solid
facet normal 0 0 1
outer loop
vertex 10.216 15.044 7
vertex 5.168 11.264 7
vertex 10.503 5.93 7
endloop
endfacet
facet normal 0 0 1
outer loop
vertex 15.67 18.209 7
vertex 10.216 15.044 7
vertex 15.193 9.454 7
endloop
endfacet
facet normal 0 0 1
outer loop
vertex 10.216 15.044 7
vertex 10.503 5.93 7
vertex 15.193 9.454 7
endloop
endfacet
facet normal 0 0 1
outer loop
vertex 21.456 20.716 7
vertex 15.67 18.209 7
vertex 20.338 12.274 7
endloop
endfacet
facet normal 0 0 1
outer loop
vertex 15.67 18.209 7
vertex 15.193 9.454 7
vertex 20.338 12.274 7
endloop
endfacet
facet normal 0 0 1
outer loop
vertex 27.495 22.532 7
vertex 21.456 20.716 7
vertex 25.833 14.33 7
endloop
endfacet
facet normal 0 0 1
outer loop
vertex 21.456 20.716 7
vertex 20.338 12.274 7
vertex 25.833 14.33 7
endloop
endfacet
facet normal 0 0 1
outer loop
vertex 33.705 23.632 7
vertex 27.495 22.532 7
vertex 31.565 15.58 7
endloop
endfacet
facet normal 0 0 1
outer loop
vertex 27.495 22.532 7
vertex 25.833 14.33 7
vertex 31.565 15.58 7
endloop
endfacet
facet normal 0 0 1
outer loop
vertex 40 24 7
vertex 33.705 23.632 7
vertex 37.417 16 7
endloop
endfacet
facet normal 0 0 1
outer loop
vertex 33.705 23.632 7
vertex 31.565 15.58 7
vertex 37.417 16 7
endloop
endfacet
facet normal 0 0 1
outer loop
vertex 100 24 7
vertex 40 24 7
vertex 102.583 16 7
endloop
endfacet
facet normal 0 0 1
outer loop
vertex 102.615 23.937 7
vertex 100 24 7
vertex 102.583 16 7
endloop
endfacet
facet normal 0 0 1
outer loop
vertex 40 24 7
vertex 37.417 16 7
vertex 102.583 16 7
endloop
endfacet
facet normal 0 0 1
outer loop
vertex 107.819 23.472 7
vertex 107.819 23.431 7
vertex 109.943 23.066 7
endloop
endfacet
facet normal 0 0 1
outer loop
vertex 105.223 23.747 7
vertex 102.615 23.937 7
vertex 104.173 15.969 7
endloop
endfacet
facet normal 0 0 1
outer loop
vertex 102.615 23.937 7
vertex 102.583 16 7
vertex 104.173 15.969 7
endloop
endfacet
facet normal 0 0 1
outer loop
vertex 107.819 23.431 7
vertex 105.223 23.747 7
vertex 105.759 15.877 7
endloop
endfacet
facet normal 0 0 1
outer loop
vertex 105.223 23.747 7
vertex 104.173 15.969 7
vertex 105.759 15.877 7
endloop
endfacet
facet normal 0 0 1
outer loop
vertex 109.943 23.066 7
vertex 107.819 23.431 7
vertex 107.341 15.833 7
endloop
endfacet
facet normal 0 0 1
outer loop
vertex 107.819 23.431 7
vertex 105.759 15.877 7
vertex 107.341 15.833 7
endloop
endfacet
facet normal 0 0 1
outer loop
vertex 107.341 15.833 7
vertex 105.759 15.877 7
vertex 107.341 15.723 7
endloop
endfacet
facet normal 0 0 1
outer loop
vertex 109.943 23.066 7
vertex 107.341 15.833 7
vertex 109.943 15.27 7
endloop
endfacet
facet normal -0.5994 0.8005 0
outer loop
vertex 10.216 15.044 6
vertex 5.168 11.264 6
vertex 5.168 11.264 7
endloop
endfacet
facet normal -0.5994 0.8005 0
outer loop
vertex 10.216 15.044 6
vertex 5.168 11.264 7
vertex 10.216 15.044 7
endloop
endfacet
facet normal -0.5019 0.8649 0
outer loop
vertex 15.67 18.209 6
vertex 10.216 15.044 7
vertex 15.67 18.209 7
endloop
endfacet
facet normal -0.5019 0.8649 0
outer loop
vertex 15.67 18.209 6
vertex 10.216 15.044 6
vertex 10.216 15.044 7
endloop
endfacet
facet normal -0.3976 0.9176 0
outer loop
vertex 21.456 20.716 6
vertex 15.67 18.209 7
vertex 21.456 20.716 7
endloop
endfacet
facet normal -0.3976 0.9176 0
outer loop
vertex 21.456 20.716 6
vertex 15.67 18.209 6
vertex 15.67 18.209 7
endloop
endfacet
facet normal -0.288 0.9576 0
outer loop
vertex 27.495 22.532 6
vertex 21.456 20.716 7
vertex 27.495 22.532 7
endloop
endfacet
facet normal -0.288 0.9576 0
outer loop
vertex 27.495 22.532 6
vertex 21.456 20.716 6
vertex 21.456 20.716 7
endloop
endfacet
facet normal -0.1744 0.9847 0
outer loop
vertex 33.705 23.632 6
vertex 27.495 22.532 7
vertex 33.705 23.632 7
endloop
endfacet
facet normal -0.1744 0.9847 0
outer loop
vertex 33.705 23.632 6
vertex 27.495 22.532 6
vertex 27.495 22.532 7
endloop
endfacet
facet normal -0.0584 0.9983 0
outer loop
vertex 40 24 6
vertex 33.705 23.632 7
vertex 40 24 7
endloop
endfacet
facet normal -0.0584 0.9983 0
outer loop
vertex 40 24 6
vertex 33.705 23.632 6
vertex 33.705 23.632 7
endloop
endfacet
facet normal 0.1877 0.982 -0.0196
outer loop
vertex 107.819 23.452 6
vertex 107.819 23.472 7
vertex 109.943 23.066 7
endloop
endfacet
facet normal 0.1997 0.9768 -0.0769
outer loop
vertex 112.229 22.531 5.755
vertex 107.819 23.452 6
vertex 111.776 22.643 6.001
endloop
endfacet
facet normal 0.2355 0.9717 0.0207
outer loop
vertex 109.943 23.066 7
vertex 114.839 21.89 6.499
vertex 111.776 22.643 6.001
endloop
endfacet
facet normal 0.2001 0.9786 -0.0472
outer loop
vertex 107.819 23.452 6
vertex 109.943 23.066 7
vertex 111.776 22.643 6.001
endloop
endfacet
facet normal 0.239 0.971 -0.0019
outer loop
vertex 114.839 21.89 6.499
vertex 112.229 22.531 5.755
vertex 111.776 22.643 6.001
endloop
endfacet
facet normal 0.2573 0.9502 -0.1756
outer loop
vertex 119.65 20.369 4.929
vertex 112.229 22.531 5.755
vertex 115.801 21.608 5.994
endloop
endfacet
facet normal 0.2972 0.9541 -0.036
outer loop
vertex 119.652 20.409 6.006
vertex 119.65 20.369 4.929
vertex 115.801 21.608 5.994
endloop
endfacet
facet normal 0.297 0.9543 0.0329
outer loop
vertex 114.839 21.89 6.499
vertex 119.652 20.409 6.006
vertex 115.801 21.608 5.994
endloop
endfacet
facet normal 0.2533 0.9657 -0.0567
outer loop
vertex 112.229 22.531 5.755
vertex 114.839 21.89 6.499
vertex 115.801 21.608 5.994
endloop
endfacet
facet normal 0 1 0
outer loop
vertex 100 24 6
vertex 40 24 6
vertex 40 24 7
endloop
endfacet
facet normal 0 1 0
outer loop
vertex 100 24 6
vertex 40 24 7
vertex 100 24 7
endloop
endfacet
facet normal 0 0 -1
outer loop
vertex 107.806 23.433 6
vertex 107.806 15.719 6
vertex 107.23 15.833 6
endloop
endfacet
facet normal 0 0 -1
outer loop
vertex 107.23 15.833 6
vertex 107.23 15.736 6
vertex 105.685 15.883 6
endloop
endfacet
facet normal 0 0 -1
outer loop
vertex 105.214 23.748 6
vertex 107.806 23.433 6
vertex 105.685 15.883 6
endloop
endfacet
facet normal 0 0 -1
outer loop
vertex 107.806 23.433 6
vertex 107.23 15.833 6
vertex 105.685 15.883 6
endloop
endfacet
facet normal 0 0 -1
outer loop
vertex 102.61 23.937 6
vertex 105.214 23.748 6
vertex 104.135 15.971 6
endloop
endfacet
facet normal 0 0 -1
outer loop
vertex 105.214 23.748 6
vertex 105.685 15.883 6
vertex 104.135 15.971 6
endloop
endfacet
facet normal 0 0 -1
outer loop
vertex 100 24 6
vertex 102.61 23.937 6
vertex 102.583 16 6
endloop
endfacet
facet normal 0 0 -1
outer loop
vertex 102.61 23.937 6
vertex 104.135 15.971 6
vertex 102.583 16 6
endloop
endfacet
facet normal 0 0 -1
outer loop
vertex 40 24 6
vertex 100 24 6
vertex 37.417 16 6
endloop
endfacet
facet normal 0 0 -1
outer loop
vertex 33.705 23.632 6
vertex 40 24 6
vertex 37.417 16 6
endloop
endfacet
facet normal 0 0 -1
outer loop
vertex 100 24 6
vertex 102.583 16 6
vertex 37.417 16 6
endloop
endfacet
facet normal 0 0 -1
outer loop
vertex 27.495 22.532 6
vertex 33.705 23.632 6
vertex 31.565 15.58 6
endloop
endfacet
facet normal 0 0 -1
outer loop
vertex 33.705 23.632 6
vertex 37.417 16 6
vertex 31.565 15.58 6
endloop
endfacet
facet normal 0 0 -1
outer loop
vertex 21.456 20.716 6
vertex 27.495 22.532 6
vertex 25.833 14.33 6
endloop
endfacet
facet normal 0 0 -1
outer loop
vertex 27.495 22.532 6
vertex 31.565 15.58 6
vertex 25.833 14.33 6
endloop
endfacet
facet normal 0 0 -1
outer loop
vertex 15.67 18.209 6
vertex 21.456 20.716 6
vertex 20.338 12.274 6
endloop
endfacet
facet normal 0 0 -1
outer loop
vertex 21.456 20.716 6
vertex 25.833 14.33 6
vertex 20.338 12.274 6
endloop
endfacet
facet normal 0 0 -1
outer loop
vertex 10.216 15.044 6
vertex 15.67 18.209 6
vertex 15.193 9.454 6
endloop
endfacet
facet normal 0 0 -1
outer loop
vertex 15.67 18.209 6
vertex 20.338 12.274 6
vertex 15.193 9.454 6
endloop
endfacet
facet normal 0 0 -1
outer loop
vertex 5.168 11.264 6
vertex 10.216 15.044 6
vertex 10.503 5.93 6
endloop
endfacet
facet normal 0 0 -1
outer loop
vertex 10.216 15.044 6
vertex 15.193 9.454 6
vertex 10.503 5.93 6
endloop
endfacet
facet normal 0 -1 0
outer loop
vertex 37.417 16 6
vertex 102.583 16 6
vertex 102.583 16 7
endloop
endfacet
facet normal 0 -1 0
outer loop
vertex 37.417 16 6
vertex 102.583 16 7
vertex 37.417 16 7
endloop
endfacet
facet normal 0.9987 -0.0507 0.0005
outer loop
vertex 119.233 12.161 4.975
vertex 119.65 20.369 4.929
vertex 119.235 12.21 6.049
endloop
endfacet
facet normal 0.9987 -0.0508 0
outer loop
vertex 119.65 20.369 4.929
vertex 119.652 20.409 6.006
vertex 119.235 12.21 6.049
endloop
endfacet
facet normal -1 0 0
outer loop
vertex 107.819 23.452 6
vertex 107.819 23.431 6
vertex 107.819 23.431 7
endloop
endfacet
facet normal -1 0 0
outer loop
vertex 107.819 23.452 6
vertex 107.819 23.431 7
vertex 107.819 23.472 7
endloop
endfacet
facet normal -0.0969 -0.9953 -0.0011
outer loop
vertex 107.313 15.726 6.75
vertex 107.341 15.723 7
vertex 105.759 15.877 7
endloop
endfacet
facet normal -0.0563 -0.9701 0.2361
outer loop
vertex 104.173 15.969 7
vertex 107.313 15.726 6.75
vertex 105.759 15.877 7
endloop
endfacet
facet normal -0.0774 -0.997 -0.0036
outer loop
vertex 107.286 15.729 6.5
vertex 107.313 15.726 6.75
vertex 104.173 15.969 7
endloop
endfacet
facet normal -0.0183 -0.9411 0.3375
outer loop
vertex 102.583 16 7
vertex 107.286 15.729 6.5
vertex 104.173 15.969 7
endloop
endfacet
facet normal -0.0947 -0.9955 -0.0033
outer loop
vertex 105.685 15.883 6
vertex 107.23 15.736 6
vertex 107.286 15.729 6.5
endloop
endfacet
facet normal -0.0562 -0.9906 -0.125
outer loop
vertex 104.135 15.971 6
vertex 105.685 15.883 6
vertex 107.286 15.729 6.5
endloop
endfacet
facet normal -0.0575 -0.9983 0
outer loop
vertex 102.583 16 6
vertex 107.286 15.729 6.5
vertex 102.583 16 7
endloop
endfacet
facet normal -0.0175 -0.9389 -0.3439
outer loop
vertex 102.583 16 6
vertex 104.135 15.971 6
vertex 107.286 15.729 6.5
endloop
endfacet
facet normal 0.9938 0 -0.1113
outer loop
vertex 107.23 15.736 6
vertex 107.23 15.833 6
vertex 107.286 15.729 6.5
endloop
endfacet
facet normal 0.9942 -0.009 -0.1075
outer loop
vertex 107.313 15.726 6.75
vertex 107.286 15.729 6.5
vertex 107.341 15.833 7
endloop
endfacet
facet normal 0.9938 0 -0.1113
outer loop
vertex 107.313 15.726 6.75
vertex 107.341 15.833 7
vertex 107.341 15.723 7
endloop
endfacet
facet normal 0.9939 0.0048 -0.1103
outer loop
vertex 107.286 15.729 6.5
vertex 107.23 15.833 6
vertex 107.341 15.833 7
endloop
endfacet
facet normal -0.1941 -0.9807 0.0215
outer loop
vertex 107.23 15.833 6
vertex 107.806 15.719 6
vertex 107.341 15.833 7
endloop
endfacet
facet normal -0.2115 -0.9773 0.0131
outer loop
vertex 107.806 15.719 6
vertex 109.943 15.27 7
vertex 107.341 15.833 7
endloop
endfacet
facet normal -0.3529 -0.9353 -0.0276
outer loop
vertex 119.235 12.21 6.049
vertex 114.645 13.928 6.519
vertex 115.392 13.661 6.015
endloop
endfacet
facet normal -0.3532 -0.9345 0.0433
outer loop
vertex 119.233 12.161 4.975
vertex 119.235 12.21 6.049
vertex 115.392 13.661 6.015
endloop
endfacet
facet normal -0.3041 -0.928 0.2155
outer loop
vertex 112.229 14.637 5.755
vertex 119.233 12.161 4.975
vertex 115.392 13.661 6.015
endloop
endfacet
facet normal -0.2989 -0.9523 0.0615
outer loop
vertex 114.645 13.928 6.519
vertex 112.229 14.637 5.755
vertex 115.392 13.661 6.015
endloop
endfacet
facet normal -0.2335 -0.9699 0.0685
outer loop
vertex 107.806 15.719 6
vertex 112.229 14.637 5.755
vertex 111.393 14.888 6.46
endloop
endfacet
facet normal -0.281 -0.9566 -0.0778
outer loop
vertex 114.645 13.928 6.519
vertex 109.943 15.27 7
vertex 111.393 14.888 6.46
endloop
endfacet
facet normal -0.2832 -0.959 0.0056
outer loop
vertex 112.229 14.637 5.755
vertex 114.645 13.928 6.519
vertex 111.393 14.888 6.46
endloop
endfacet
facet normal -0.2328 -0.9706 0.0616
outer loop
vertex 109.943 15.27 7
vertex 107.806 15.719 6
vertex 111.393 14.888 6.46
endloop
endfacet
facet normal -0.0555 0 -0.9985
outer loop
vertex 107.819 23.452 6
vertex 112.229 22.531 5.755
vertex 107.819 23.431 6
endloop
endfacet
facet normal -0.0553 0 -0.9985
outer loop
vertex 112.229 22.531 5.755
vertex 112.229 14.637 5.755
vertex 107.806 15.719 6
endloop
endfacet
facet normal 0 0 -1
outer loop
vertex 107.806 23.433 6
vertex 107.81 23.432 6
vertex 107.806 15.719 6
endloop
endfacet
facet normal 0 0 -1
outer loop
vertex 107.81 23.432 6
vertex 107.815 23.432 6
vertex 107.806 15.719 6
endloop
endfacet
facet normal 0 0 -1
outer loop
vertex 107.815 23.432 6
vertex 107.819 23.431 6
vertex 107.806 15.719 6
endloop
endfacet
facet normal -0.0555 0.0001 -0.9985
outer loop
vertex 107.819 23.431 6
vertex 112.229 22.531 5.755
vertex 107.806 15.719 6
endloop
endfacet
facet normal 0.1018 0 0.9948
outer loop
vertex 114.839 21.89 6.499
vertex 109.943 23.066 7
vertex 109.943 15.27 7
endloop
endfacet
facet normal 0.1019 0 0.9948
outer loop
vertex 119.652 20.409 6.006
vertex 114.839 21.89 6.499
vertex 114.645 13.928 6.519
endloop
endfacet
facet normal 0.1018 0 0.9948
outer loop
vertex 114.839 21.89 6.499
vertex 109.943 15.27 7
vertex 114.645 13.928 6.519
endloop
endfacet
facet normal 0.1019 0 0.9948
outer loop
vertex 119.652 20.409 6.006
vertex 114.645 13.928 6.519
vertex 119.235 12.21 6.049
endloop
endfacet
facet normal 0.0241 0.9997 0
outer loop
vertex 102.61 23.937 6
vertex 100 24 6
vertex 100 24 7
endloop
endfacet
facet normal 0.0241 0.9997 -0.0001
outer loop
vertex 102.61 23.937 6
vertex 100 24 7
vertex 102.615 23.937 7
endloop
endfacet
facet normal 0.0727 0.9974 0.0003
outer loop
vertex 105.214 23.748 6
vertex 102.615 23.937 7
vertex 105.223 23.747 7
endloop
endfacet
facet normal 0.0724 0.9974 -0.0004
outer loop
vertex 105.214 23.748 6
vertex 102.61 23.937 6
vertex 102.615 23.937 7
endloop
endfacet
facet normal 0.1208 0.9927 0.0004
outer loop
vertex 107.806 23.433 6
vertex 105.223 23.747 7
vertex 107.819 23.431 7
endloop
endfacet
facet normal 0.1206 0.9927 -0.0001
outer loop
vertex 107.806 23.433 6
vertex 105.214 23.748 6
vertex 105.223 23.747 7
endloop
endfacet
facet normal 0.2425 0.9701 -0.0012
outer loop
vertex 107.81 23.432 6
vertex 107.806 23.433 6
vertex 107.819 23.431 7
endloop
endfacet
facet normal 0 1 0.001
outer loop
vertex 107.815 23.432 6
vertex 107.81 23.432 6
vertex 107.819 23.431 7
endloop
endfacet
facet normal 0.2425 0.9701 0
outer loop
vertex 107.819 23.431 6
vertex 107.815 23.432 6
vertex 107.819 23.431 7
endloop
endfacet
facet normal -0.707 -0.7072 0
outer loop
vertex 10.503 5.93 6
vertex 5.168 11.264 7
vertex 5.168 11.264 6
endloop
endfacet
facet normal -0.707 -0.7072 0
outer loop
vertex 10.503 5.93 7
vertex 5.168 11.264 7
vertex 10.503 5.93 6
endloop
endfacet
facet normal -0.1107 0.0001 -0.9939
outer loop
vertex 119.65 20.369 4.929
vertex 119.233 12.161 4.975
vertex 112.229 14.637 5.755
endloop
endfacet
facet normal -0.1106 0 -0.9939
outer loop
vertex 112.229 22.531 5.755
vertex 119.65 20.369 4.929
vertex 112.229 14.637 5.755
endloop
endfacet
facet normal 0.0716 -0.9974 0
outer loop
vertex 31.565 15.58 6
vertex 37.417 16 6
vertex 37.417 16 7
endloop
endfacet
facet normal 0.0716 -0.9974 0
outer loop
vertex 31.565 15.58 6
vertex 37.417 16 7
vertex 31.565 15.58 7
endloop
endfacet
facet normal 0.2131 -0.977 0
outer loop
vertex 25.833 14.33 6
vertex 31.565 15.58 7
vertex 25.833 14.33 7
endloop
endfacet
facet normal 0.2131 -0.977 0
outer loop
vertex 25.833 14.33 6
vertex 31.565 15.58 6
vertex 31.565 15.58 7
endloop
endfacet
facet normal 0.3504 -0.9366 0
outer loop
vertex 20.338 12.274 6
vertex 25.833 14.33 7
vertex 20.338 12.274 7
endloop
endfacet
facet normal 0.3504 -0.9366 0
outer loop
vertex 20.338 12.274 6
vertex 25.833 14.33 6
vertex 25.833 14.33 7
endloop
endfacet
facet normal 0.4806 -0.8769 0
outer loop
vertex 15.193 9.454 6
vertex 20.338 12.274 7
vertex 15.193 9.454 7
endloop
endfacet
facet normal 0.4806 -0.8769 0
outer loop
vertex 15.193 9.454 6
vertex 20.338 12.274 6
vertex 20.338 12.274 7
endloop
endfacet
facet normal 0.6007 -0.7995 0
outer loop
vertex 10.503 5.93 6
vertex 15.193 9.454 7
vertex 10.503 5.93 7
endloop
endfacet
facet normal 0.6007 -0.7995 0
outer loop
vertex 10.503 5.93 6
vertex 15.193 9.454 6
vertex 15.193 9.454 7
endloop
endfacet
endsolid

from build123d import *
from OCP.BRepAlgoAPI import BRepAlgoAPI_Cut
from OCP.TopTools import TopTools_ListOfShape

# Parameters (mm, degrees)
SKETCH10_R              = 1.5
BOSS_EXTRUDE2_DEPTH     = 18
CUT_EXTRUDE1_DEPTH      = 53
CUT_EXTRUDE1_DEPTH_BACK = 21
SKETCH12_R              = 101.363268326
CUT_EXTRUDE2_DEPTH      = 4
CUT_EXTRUDE3_DEPTH      = 4
CUT_EXTRUDE3_DEPTH_BACK = 4
CUT_EXTRUDE4_DEPTH      = 149.963082804
CUT_EXTRUDE4_DEPTH_BACK = 149.963082804
CUT_EXTRUDE5_DEPTH      = 123.927520285
CUT_EXTRUDE5_DEPTH_BACK = 123.927520285


with BuildPart() as part:
    # Sketch10 → Boss-Extrude2 (new body)
    with BuildSketch(Plane.XY):
        with BuildLine():
            Line((37.416573868, 15), (102.583426132, 15))
            ThreePointArc((102.583426132, 15), (121.439606964, 10.276684148), (135.842602904, -2.777777778))
            ThreePointArc((135.842602904, -2.777777778), (142.889960635, -4.080211701), (144, 3))
            ThreePointArc((144, 3), (124.596747752, 19.193495505), (100, 25))
            Line((100, 25), (40, 25))
            ThreePointArc((40, 25), (15.403252248, 19.193495505), (-4, 3))
            ThreePointArc((-4, 3), (-2.889960635, -4.080211701), (4.157397096, -2.777777778))
            ThreePointArc((4.157397096, -2.777777778), (18.560393036, 10.276684148), (37.416573868, 15))
        make_face()
        Circle(SKETCH10_R, mode=Mode.SUBTRACT)
        with Locations((140, 0)):
            Circle(SKETCH10_R, mode=Mode.SUBTRACT)
    extrude(amount=BOSS_EXTRUDE2_DEPTH)

    # Sketch12 → Cut-Extrude1 (cut, two sides: drawn at the far end of the back side and taken through both)
    with BuildSketch(Plane(origin=(0, 0, 0), x_dir=(1, 0, 0), z_dir=(0, 1, 0)).offset(-CUT_EXTRUDE1_DEPTH_BACK)):
        with Locations((76.008049748, -10.931288324)):
            Circle(SKETCH12_R)
        with BuildLine():
            Line((-5, -6), (-5, -14))
            Line((-5, -14), (107.805696866, -14))
            ThreePointArc((107.805696866, -14), (113.026744555, -14.342205545), (118.15845867, -15.362966948))
            Line((118.15845867, -15.362966948), (122.913338099, -16.637033052))
            ThreePointArc((122.913338099, -16.637033052), (128.045052215, -17.657794455), (133.266099903, -18))
            Line((133.266099903, -18), (145, -18))
            Line((145, -18), (145, -14))
            Line((145, -14), (130, -14))
            Line((130, -14), (126.989127027, -13.193239018))
            ThreePointArc((126.989127027, -13.193239018), (125.143296129, -10.589859532), (127.359731004, -8.293755679))
            Line((127.359731004, -8.293755679), (130, -8))
            Line((130, -8), (145, -8))
            Line((145, -8), (145, -4))
            Line((145, -4), (130.2183511, -4))
            ThreePointArc((130.2183511, -4), (128.003403615, -4.061371986), (125.795252917, -4.245299618))
            Line((125.795252917, -4.245299618), (112.228795048, -5.754700382))
            ThreePointArc((112.228795048, -5.754700382), (110.02064435, -5.938628014), (107.805696866, -6))
            Line((107.805696866, -6), (-5, -6))
        make_face(mode=Mode.SUBTRACT)
    extrude(amount=CUT_EXTRUDE1_DEPTH + CUT_EXTRUDE1_DEPTH_BACK, mode=Mode.SUBTRACT)


with BuildPart() as cut_extrude2_tool:
    # Sketch14 → Cut-Extrude2 (new body)
    with BuildSketch(Plane(origin=(0, 0, 6), x_dir=(-1, 0, 0), z_dir=(0, 0, -1))):
        with BuildLine():
            Line((-102.583426132, 16), (-37.416573868, 16))
            ThreePointArc((-37.416573868, 16), (-22.580527687, 13.221613437), (-9.75522645, 5.2630114))
            Line((-9.75522645, 5.2630114), (-4.407881121, 10.610356729))
            ThreePointArc((-4.407881121, 10.610356729), (-20.986311028, 20.541860192), (-40, 24))
            Line((-40, 24), (-100, 24))
            ThreePointArc((-100, 24), (-103.919892318, 23.857538416), (-107.819101893, 23.430905341))
            Line((-107.819101893, 23.430905341), (-107.819101893, 35.168317198))
            Line((-107.819101893, 35.168317198), (17.162371348, 35.168317198))
            Line((17.162371348, 35.168317198), (17.162371348, -18.766284645))
            Line((17.162371348, -18.766284645), (-107.819101893, -18.766284645))
            Line((-107.819101893, -18.766284645), (-107.819101893, 15.664329569))
            ThreePointArc((-107.819101893, 15.664329569), (-105.206638634, 15.915996336), (-102.583426132, 16))
        make_face()
    extrude(amount=-CUT_EXTRUDE2_DEPTH)


with BuildPart() as part_1:
    add(part.part)

    # Cut-Extrude2: cut by cut_extrude2_tool, with a tolerance
    cut_extrude2_stock = TopTools_ListOfShape()
    cut_extrude2_stock.Append(part_1.part.wrapped)
    cut_extrude2_tools = TopTools_ListOfShape()
    cut_extrude2_tools.Append(cut_extrude2_tool.part.wrapped)
    cut_extrude2_cut = BRepAlgoAPI_Cut()
    cut_extrude2_cut.SetArguments(cut_extrude2_stock)
    cut_extrude2_cut.SetTools(cut_extrude2_tools)
    cut_extrude2_cut.SetFuzzyValue(0.00001)
    cut_extrude2_cut.Build()
    add(Compound.cast(cut_extrude2_cut.Shape()).solids(), mode=Mode.REPLACE)

    # Sketch15 → Cut-Extrude3 (cut, two sides: drawn at the far end of the back side and taken through both)
    with BuildSketch(Plane(origin=(2.00470116, 0, 18.018205945), x_dir=(-0.9938675095528059, 0, 0.11057745455246941), z_dir=(-0.11057745455246942, 0, -0.993867509552806)).offset(-CUT_EXTRUDE3_DEPTH_BACK)):
        with BuildLine():
            Line((-119.163095282, 20.093526394), (-118.740012656, 11.822126877))
            add(Edge.make_bspline(
                [(-118.740012656, 11.822126877), (-114.62508956, 13.623450352), (-110.296692622, 14.978589212), (-105.908841603, 15.833395956)],
                knots=[-1.219718725, -1.219718725, -1.219718725, -1.219718725, -0.997934063, -0.997934063, -0.997934063, -0.997934063], degree=3))
            Line((-105.908841603, 15.833395956), (-105.908841603, 7.414190779))
            Line((-105.908841603, 7.414190779), (-142.752233985, -17.524399772))
            Line((-142.752233985, -17.524399772), (-150.166718445, 16.856471942))
            Line((-150.166718445, 16.856471942), (-106.447848094, 34.09271449))
            Line((-106.447848094, 34.09271449), (-105.908841603, 23.554966644))
            add(Edge.make_bspline(
                [(-105.908841603, 23.554966644), (-110.40344818, 22.781977164), (-114.85327417, 21.619160072), (-119.163095282, 20.093526394)],
                knots=[-1.323472262, -1.323472262, -1.323472262, -1.323472262, -1.152490077, -1.152490077, -1.152490077, -1.152490077], degree=3))
        make_face()
    extrude(amount=CUT_EXTRUDE3_DEPTH + CUT_EXTRUDE3_DEPTH_BACK, mode=Mode.SUBTRACT)

    # Sketch16 → Cut-Extrude4 (cut, two sides: drawn at the far end of the back side and taken through both)
    with BuildSketch(Plane(origin=(0, 24, 0), x_dir=(1, 0, 0), z_dir=(0, 1, 0)).offset(-CUT_EXTRUDE4_DEPTH_BACK)):
        Polygon((3.407881121, -7), (109.942912406, -7), (121.047014556, -5.863668195), (121.047014556, -0.454097239), (147.279060568, 4.078614092), (150.076867714, -41.016929059), (122.104873778, -29.787827075), (117.671018844, -29.787827075), (117.671018844, -30.883133113), (3.407881121, -30.883133113), (-7.729647631, -28.692521036), (-16.239396681, -3.124111032), (3.407881121, -0.69185953), align=None)
    extrude(amount=CUT_EXTRUDE4_DEPTH + CUT_EXTRUDE4_DEPTH_BACK, mode=Mode.SUBTRACT)

    # Sketch17 → Cut-Extrude5 (cut, two sides: drawn at the far end of the back side and taken through both)
    with BuildSketch(Plane(origin=(0, 0, 6), x_dir=(-1, 0, 0), z_dir=(0, 0, -1)).offset(-CUT_EXTRUDE5_DEPTH_BACK)):
        Polygon((-4.33267462, 12.099776793), (-11.665353096, 4.767098316), (-11.583019887, 4.684765107), (-10.593616865, 3.695362084), (-1.134184227, 10.251312954), align=None)
        Polygon((-119.713110979, 21.610434881), (-119.111195403, 9.770184261), (-121.889059026, 7.660492949), (-122.569179785, 21.039113751), align=None)
    extrude(amount=CUT_EXTRUDE5_DEPTH + CUT_EXTRUDE5_DEPTH_BACK, mode=Mode.SUBTRACT)


solid = part_1.part
